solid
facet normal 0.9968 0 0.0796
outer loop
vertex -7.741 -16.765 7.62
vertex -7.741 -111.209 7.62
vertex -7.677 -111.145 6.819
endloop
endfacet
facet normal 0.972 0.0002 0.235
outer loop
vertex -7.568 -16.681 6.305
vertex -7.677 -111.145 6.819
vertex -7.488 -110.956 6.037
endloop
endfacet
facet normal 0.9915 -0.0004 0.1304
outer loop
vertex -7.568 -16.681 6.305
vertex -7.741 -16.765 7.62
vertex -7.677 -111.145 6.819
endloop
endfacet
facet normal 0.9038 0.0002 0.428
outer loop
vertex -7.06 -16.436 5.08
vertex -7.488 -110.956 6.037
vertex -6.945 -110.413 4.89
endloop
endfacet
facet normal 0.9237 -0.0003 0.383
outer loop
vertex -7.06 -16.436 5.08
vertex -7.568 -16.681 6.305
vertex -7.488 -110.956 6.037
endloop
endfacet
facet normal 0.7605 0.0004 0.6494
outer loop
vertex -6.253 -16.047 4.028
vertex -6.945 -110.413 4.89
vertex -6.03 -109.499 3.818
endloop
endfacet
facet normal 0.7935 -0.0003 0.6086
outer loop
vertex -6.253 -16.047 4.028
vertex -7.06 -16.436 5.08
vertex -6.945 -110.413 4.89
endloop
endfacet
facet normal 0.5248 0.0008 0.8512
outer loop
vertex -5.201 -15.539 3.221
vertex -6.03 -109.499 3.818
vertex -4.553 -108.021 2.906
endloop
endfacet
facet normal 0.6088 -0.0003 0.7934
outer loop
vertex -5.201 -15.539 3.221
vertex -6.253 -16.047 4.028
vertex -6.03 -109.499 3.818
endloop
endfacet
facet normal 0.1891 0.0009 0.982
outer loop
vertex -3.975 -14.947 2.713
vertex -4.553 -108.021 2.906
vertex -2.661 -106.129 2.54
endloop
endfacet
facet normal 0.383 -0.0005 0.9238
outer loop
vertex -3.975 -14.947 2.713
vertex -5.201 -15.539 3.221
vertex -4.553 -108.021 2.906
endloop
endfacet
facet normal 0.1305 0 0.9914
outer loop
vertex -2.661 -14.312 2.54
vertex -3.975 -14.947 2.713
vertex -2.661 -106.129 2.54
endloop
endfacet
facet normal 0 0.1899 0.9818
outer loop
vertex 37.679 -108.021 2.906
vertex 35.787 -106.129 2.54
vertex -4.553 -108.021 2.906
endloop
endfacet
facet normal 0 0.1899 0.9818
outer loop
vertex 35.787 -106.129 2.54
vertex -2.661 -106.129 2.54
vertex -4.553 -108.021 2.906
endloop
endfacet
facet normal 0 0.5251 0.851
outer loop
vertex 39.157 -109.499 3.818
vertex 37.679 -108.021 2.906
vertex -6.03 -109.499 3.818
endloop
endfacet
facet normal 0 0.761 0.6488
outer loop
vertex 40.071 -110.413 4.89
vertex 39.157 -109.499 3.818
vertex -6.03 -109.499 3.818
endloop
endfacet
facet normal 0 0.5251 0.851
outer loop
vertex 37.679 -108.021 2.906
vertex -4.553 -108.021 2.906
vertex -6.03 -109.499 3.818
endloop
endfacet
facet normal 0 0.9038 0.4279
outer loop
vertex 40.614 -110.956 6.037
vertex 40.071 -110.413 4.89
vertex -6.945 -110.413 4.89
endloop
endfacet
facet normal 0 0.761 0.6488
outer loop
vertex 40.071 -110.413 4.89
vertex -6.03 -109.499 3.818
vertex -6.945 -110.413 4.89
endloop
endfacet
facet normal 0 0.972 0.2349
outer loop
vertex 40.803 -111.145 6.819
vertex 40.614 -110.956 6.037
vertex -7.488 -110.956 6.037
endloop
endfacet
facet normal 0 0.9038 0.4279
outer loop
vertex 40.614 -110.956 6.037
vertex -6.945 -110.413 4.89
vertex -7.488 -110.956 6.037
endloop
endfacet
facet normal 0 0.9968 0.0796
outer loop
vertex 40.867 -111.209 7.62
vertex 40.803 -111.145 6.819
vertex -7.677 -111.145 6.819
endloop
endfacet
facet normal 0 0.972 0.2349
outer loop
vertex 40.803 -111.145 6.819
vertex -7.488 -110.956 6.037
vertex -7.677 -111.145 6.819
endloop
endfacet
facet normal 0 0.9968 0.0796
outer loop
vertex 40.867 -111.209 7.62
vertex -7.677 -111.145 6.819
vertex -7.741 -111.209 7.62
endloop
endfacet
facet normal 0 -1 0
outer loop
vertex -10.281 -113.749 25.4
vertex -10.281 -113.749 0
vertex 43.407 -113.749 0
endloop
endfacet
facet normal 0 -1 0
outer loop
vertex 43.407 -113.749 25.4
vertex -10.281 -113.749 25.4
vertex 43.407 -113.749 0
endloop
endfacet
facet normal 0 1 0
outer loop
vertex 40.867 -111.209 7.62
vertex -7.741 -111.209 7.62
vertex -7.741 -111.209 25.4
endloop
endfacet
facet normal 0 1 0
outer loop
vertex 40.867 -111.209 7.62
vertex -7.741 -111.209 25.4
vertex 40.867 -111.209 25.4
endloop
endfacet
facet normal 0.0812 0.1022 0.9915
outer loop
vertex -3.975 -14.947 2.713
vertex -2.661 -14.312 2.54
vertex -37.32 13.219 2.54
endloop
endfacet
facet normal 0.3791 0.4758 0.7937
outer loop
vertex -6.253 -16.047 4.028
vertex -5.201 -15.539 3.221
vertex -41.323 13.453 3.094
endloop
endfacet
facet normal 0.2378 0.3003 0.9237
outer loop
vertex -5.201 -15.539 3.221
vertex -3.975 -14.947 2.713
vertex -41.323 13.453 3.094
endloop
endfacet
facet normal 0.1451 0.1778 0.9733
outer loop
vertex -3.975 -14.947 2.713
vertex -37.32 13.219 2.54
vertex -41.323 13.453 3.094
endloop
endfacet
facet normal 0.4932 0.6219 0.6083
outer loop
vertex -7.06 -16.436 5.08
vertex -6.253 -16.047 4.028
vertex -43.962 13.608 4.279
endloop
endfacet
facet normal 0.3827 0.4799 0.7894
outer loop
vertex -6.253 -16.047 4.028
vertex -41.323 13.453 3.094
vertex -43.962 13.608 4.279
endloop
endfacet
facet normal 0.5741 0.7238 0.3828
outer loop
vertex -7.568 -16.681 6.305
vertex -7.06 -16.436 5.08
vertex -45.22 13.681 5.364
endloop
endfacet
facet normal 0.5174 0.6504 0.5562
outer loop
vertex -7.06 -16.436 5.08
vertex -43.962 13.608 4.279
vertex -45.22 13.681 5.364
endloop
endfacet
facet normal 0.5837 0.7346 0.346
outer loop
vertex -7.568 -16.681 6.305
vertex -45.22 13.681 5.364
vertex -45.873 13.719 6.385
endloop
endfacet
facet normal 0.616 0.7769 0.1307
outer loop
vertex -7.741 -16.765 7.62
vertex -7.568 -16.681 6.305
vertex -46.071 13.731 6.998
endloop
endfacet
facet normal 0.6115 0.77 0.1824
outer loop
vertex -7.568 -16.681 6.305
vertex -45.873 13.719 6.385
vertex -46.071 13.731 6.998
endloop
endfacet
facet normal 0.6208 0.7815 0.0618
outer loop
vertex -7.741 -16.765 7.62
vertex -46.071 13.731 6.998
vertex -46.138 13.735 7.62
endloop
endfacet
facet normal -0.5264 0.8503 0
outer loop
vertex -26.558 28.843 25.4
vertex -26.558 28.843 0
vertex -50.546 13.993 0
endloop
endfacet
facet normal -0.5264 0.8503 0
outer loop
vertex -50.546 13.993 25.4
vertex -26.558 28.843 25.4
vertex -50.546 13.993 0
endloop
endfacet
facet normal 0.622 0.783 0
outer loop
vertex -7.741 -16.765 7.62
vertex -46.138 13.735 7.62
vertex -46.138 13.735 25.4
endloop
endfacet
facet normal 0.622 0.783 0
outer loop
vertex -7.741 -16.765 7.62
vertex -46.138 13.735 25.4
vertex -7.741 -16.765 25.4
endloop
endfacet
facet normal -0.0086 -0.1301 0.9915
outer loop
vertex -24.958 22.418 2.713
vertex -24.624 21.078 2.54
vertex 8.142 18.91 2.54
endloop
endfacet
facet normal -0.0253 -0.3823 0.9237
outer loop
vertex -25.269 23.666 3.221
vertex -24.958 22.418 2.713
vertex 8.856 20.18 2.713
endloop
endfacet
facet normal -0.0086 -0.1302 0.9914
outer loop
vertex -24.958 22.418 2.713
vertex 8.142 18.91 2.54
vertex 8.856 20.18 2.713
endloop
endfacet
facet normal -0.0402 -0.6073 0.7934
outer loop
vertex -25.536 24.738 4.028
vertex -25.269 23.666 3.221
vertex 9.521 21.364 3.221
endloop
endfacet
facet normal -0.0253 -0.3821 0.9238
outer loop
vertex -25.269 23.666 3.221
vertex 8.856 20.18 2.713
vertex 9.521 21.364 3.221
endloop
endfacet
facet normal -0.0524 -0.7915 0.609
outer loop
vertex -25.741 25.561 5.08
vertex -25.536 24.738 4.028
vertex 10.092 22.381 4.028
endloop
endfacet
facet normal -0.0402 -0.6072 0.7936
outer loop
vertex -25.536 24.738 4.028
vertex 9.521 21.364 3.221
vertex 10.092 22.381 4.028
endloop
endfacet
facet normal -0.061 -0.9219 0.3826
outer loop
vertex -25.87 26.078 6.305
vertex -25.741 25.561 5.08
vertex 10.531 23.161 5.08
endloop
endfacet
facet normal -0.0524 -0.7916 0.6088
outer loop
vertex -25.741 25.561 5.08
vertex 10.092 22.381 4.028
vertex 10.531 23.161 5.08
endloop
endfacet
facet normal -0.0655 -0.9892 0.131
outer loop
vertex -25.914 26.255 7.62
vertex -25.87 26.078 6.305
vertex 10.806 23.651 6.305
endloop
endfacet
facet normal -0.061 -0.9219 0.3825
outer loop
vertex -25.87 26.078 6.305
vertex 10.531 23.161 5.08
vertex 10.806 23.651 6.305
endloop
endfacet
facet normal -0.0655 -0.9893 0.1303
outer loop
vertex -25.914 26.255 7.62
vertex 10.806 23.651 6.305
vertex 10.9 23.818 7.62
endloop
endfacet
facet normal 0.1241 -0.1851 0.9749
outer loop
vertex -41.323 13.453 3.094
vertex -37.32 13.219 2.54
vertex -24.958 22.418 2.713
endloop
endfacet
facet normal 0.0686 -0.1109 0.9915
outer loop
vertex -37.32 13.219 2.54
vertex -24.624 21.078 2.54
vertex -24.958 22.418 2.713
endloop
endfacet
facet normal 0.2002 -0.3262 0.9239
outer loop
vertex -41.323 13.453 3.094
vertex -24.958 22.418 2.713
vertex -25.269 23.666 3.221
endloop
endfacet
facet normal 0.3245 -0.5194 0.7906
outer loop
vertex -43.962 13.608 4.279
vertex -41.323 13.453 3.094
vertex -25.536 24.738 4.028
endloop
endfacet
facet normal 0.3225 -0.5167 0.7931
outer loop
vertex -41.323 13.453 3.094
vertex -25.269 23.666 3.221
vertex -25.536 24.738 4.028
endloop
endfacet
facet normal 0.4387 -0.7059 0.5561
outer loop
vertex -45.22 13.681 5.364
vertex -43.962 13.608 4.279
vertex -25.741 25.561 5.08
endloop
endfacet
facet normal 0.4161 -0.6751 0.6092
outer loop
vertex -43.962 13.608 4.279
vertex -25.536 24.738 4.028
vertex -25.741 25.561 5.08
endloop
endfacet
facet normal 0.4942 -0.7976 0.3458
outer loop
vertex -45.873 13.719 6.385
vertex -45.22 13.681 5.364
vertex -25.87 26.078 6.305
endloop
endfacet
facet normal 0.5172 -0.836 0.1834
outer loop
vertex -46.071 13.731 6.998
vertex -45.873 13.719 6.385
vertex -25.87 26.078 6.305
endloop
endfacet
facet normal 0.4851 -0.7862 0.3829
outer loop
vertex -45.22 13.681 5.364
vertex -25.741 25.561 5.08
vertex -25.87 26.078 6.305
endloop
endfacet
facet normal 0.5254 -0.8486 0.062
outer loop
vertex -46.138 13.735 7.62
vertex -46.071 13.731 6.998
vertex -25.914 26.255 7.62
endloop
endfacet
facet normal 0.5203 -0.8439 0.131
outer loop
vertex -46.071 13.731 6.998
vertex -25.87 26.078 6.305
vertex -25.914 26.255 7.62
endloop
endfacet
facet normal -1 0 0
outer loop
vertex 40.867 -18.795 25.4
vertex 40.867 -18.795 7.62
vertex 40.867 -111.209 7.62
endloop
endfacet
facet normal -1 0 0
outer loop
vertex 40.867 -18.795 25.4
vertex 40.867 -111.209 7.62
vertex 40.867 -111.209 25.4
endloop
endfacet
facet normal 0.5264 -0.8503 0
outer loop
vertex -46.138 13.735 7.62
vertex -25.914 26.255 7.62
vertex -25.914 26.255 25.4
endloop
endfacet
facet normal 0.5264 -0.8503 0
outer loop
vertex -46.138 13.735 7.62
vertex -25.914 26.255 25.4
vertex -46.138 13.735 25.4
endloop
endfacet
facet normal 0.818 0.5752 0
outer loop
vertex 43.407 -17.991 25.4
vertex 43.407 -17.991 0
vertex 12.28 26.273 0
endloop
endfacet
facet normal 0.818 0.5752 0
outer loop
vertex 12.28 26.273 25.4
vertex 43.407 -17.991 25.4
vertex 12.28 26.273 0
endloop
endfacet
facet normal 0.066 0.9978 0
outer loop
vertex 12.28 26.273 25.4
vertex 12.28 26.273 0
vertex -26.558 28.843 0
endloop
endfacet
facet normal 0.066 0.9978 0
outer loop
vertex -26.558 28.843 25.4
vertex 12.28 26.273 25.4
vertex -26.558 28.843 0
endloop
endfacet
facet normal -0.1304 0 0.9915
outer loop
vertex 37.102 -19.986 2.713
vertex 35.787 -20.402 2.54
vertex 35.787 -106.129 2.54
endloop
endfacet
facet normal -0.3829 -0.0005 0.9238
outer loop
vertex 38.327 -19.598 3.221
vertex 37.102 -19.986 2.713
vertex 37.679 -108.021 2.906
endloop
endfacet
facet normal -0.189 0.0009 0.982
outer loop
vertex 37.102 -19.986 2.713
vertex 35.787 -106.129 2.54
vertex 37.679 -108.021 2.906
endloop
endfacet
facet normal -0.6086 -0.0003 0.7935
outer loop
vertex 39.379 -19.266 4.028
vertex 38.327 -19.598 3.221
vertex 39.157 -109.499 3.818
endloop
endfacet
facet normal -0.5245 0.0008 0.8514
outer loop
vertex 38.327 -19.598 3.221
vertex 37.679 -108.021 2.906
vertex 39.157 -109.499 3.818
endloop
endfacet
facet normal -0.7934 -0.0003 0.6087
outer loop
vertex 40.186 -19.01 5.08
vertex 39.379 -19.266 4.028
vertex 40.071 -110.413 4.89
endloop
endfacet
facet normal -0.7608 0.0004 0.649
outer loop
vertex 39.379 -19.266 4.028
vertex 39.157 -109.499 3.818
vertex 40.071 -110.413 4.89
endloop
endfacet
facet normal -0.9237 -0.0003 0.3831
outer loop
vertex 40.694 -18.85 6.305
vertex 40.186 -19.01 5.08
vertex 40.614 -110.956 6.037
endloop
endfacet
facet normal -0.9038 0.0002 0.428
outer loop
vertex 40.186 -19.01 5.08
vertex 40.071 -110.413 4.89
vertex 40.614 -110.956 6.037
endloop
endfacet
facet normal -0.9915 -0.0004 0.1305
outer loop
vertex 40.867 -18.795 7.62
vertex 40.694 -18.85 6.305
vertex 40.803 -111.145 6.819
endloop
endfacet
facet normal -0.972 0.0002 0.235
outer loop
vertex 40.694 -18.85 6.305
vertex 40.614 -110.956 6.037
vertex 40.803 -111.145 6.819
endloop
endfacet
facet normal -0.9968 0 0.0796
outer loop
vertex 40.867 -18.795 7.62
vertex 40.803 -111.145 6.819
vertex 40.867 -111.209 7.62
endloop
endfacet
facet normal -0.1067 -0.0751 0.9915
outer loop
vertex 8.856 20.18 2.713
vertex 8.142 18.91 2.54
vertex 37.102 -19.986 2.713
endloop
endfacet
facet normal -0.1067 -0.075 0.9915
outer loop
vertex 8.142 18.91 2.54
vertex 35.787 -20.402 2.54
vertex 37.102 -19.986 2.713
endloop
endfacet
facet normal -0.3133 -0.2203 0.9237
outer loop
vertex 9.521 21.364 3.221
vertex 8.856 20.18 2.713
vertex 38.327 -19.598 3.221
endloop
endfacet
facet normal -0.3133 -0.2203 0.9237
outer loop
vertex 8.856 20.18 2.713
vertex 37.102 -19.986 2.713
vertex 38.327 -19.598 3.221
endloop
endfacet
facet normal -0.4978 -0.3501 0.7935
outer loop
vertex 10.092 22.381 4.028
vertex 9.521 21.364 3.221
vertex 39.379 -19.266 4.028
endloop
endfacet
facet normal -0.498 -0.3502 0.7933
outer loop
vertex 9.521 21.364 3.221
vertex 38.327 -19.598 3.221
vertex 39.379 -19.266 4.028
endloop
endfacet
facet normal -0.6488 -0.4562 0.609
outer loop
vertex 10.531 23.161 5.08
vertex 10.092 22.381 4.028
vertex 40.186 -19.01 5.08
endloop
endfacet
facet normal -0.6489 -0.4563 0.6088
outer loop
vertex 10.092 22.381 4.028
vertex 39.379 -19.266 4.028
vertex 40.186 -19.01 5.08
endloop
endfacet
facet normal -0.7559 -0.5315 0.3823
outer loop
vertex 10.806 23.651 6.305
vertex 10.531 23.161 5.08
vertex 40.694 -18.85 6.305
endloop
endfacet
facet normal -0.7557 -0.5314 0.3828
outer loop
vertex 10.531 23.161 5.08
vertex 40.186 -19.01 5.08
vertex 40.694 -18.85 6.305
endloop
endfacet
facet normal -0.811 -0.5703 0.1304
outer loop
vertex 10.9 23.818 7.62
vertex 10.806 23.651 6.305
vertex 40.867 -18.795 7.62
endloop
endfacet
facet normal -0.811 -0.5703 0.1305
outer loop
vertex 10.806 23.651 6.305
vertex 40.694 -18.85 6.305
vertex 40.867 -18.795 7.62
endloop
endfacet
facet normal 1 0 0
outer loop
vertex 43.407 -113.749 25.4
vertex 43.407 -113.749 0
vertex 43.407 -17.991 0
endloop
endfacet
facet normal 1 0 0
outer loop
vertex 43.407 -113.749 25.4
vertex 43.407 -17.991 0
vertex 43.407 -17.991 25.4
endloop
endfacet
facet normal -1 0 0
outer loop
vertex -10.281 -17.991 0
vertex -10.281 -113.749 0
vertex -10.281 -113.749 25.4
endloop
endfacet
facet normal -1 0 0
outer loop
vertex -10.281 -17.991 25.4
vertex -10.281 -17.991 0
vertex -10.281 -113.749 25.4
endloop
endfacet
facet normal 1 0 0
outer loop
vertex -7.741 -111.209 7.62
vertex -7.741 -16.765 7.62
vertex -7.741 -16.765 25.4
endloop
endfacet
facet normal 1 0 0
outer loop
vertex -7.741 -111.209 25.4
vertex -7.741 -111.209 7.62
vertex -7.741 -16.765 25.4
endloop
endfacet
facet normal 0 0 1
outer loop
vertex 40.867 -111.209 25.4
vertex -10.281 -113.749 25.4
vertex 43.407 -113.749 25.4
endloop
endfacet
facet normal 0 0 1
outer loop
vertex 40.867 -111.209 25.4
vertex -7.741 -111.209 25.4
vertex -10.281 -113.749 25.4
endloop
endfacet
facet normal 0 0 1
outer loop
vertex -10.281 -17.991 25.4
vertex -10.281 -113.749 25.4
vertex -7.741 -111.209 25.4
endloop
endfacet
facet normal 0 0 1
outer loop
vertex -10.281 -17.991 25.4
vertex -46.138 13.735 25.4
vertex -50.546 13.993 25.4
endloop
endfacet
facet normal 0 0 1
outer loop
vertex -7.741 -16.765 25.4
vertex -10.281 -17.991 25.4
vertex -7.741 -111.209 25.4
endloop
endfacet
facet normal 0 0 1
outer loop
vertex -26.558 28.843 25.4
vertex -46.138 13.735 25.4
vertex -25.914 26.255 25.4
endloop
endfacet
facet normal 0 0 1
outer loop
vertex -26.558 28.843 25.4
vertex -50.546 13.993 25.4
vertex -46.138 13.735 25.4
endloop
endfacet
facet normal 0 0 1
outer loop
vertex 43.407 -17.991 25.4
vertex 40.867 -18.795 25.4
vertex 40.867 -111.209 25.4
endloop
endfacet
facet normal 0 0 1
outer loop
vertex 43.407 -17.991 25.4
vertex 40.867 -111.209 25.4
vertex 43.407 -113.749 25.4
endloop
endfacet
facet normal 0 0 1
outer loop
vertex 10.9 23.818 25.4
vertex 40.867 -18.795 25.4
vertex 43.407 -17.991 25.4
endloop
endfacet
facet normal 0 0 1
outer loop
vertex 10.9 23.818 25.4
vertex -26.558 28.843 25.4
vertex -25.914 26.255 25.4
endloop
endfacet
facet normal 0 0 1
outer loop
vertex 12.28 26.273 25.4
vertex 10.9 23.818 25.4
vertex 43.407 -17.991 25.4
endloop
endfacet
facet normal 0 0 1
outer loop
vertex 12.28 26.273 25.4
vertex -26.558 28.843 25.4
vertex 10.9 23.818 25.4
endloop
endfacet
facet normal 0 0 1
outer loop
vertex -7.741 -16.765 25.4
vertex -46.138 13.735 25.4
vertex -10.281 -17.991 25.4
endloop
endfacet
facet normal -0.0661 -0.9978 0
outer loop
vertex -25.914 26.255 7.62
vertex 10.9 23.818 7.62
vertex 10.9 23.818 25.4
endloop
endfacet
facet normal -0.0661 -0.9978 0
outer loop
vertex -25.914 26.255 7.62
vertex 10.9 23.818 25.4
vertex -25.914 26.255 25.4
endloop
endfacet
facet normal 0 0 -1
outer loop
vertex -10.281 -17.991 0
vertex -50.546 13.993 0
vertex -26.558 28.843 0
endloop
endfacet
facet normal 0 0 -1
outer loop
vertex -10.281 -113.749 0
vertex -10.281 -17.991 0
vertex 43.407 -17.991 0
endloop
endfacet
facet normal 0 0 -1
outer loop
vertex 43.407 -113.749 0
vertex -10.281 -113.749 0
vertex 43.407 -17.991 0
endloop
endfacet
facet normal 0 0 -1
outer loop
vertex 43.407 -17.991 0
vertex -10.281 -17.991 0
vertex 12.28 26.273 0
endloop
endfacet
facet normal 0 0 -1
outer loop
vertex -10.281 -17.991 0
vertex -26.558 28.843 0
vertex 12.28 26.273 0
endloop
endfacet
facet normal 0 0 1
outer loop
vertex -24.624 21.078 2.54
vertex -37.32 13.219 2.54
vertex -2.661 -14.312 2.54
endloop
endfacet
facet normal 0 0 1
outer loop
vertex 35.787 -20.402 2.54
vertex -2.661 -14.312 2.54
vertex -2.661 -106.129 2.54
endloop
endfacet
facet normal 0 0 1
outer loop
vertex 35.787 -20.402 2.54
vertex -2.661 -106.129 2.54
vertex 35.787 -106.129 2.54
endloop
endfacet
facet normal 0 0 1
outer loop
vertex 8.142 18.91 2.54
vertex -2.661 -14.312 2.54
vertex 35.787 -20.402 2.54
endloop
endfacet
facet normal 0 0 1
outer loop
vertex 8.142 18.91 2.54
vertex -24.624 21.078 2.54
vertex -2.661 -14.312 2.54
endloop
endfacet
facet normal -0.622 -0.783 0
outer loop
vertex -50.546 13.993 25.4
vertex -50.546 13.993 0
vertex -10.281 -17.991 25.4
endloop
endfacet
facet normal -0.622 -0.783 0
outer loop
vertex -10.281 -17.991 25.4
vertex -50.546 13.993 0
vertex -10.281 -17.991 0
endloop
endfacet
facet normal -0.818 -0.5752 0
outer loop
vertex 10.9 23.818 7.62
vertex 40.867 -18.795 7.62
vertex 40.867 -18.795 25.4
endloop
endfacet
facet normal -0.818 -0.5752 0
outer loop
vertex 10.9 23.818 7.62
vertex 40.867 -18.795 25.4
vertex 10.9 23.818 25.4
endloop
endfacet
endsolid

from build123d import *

# Parameters (mm, degrees)
F1_DEPTH = 25.4
F2_DEPTH = 95.758
F3_T     = -2.54
F4_R     = 5.08


with BuildPart() as f1:
    # F0 (on Top) → F1 (new body)
    with BuildSketch(Plane.XY):
        Polygon((-26.5582557768, 28.8428422064), (-50.5463592708, 13.993062079), (-10.2806119248, -17.9910771549), (43.4070453048, -17.9910771549), (12.2796297073, 26.272688061), align=None)
    extrude(amount=F1_DEPTH)

    # F2 (add): a face of the model
    f2_faces = [f1.faces().sort_by_distance(p)[0] for p in [
        (16.56321669, -17.9910771549, 12.7),
    ]]
    extrude(f2_faces, amount=F2_DEPTH)

    # F3
    f3_openings = [f1.faces().sort_by_distance(p)[0] for p in [
        (9.617163, -41.24323, 25.4),
    ]]
    offset(amount=F3_T, openings=f3_openings, kind=Kind.INTERSECTION)

    # F4
    f4_edges = [f1.edges().sort_by_distance(p)[0] for p in [
        (40.867045, -65.001919, 2.54),
        (16.563217, -111.209077, 2.54),
        (-7.740612, -63.98697, 2.54),
        (-26.939148, -1.514961, 2.54),
        (-36.025631, 19.994782, 2.54),
        (-7.506603, 25.036515, 2.54),
        (25.883709, 2.511823, 2.54),
    ]]
    fillet(f4_edges, radius=F4_R)


solid = f1.part
